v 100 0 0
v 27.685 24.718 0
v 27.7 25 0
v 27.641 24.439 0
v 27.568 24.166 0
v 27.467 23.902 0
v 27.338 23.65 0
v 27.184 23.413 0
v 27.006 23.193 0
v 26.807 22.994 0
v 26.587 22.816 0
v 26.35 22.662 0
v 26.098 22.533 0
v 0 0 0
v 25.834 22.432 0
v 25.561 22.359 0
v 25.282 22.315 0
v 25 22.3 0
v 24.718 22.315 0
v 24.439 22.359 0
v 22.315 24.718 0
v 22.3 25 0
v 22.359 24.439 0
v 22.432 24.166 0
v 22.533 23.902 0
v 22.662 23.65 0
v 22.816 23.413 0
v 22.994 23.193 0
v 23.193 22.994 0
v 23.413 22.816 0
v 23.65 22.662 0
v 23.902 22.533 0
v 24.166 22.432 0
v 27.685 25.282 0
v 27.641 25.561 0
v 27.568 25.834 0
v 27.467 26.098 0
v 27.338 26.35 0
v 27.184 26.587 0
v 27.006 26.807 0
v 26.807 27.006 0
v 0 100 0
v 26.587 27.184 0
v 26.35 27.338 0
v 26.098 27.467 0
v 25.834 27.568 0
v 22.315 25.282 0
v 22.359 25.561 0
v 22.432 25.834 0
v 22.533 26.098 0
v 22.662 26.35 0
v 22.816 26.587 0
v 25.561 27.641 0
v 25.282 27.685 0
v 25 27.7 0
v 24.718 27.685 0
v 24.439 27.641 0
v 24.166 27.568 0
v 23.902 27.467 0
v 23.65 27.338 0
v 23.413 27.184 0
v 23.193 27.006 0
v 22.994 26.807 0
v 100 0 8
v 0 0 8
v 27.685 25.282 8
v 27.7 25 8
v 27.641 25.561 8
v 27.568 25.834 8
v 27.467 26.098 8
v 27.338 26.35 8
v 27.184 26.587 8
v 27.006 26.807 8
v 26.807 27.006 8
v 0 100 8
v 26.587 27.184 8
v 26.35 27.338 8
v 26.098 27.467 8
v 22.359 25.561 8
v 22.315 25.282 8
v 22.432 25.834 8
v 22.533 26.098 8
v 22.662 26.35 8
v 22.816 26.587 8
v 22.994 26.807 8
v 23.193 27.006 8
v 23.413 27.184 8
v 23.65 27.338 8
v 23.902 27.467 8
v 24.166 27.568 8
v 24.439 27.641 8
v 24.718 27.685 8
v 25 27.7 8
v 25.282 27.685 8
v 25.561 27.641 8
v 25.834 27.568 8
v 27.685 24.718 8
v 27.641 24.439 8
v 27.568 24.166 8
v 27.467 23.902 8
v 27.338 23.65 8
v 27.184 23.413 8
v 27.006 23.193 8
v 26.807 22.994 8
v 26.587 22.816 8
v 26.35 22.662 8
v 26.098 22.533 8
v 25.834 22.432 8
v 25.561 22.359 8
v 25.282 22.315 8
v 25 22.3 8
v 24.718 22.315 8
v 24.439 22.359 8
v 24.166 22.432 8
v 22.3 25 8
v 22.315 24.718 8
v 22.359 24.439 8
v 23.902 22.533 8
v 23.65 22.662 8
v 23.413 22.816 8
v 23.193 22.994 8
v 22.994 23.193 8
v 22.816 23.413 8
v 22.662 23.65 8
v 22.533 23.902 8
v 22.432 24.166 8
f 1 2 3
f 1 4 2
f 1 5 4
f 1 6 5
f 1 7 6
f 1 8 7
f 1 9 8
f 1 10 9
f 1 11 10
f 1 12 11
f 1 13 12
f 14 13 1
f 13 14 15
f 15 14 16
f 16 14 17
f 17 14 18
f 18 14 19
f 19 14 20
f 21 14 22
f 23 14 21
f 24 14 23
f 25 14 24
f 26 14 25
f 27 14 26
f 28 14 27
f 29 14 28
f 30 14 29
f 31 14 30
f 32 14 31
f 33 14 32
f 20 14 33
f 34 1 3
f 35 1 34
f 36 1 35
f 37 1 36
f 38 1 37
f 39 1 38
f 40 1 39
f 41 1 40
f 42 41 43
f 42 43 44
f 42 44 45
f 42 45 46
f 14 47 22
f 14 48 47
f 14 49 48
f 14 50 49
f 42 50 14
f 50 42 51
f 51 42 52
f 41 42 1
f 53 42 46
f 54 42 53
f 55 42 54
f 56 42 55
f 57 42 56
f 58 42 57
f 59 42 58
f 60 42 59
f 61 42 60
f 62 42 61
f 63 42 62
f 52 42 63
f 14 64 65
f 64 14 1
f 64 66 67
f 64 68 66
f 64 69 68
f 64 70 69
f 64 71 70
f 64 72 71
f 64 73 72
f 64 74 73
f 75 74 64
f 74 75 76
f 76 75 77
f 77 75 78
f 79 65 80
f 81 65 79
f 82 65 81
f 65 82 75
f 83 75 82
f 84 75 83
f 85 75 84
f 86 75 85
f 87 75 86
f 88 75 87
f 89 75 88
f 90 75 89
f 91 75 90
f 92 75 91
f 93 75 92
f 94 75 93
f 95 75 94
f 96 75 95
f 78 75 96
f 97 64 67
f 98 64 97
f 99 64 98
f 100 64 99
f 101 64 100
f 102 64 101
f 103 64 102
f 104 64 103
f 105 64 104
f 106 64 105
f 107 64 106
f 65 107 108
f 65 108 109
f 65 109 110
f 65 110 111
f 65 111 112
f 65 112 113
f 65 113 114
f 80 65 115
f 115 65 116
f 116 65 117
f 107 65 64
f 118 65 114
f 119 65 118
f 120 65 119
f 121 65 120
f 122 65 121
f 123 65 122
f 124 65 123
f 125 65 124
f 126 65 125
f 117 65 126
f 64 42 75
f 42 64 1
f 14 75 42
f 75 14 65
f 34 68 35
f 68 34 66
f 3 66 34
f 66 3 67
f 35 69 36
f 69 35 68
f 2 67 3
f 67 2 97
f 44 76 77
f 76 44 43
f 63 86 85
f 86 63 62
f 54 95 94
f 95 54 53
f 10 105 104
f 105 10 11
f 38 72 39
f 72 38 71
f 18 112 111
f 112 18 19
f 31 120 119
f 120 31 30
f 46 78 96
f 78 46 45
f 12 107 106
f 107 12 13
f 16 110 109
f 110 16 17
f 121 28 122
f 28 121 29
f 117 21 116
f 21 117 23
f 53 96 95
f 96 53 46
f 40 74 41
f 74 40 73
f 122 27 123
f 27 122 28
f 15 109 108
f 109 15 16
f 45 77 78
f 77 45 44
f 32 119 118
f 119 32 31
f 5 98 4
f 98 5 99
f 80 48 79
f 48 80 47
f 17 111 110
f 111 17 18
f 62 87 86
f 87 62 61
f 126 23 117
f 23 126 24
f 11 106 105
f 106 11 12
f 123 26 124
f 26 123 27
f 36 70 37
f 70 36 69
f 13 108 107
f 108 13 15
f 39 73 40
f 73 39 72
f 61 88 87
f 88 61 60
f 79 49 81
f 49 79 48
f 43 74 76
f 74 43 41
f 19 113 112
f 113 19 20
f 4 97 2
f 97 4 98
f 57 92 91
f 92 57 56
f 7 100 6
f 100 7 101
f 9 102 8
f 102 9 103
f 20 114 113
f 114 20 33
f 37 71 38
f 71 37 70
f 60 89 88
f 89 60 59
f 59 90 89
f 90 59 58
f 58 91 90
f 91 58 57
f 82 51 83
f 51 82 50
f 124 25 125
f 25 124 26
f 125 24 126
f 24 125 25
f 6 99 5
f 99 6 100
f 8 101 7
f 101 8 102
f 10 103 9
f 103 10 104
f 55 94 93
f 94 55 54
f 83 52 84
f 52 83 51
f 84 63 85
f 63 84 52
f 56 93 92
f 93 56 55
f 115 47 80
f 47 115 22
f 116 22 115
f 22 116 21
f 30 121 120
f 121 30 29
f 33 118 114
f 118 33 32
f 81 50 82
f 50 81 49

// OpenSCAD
// Triangular reinforcement gusset.
$fn = 60;
eps = 0.02;
leg = 100;
thickness = 8;
difference() {
    linear_extrude(height=thickness) polygon(points=[[0,0],[leg,0],[0,leg]]);
    translate([leg*0.25,leg*0.25,-eps]) cylinder(d=5.4,h=thickness+2*eps);
}
